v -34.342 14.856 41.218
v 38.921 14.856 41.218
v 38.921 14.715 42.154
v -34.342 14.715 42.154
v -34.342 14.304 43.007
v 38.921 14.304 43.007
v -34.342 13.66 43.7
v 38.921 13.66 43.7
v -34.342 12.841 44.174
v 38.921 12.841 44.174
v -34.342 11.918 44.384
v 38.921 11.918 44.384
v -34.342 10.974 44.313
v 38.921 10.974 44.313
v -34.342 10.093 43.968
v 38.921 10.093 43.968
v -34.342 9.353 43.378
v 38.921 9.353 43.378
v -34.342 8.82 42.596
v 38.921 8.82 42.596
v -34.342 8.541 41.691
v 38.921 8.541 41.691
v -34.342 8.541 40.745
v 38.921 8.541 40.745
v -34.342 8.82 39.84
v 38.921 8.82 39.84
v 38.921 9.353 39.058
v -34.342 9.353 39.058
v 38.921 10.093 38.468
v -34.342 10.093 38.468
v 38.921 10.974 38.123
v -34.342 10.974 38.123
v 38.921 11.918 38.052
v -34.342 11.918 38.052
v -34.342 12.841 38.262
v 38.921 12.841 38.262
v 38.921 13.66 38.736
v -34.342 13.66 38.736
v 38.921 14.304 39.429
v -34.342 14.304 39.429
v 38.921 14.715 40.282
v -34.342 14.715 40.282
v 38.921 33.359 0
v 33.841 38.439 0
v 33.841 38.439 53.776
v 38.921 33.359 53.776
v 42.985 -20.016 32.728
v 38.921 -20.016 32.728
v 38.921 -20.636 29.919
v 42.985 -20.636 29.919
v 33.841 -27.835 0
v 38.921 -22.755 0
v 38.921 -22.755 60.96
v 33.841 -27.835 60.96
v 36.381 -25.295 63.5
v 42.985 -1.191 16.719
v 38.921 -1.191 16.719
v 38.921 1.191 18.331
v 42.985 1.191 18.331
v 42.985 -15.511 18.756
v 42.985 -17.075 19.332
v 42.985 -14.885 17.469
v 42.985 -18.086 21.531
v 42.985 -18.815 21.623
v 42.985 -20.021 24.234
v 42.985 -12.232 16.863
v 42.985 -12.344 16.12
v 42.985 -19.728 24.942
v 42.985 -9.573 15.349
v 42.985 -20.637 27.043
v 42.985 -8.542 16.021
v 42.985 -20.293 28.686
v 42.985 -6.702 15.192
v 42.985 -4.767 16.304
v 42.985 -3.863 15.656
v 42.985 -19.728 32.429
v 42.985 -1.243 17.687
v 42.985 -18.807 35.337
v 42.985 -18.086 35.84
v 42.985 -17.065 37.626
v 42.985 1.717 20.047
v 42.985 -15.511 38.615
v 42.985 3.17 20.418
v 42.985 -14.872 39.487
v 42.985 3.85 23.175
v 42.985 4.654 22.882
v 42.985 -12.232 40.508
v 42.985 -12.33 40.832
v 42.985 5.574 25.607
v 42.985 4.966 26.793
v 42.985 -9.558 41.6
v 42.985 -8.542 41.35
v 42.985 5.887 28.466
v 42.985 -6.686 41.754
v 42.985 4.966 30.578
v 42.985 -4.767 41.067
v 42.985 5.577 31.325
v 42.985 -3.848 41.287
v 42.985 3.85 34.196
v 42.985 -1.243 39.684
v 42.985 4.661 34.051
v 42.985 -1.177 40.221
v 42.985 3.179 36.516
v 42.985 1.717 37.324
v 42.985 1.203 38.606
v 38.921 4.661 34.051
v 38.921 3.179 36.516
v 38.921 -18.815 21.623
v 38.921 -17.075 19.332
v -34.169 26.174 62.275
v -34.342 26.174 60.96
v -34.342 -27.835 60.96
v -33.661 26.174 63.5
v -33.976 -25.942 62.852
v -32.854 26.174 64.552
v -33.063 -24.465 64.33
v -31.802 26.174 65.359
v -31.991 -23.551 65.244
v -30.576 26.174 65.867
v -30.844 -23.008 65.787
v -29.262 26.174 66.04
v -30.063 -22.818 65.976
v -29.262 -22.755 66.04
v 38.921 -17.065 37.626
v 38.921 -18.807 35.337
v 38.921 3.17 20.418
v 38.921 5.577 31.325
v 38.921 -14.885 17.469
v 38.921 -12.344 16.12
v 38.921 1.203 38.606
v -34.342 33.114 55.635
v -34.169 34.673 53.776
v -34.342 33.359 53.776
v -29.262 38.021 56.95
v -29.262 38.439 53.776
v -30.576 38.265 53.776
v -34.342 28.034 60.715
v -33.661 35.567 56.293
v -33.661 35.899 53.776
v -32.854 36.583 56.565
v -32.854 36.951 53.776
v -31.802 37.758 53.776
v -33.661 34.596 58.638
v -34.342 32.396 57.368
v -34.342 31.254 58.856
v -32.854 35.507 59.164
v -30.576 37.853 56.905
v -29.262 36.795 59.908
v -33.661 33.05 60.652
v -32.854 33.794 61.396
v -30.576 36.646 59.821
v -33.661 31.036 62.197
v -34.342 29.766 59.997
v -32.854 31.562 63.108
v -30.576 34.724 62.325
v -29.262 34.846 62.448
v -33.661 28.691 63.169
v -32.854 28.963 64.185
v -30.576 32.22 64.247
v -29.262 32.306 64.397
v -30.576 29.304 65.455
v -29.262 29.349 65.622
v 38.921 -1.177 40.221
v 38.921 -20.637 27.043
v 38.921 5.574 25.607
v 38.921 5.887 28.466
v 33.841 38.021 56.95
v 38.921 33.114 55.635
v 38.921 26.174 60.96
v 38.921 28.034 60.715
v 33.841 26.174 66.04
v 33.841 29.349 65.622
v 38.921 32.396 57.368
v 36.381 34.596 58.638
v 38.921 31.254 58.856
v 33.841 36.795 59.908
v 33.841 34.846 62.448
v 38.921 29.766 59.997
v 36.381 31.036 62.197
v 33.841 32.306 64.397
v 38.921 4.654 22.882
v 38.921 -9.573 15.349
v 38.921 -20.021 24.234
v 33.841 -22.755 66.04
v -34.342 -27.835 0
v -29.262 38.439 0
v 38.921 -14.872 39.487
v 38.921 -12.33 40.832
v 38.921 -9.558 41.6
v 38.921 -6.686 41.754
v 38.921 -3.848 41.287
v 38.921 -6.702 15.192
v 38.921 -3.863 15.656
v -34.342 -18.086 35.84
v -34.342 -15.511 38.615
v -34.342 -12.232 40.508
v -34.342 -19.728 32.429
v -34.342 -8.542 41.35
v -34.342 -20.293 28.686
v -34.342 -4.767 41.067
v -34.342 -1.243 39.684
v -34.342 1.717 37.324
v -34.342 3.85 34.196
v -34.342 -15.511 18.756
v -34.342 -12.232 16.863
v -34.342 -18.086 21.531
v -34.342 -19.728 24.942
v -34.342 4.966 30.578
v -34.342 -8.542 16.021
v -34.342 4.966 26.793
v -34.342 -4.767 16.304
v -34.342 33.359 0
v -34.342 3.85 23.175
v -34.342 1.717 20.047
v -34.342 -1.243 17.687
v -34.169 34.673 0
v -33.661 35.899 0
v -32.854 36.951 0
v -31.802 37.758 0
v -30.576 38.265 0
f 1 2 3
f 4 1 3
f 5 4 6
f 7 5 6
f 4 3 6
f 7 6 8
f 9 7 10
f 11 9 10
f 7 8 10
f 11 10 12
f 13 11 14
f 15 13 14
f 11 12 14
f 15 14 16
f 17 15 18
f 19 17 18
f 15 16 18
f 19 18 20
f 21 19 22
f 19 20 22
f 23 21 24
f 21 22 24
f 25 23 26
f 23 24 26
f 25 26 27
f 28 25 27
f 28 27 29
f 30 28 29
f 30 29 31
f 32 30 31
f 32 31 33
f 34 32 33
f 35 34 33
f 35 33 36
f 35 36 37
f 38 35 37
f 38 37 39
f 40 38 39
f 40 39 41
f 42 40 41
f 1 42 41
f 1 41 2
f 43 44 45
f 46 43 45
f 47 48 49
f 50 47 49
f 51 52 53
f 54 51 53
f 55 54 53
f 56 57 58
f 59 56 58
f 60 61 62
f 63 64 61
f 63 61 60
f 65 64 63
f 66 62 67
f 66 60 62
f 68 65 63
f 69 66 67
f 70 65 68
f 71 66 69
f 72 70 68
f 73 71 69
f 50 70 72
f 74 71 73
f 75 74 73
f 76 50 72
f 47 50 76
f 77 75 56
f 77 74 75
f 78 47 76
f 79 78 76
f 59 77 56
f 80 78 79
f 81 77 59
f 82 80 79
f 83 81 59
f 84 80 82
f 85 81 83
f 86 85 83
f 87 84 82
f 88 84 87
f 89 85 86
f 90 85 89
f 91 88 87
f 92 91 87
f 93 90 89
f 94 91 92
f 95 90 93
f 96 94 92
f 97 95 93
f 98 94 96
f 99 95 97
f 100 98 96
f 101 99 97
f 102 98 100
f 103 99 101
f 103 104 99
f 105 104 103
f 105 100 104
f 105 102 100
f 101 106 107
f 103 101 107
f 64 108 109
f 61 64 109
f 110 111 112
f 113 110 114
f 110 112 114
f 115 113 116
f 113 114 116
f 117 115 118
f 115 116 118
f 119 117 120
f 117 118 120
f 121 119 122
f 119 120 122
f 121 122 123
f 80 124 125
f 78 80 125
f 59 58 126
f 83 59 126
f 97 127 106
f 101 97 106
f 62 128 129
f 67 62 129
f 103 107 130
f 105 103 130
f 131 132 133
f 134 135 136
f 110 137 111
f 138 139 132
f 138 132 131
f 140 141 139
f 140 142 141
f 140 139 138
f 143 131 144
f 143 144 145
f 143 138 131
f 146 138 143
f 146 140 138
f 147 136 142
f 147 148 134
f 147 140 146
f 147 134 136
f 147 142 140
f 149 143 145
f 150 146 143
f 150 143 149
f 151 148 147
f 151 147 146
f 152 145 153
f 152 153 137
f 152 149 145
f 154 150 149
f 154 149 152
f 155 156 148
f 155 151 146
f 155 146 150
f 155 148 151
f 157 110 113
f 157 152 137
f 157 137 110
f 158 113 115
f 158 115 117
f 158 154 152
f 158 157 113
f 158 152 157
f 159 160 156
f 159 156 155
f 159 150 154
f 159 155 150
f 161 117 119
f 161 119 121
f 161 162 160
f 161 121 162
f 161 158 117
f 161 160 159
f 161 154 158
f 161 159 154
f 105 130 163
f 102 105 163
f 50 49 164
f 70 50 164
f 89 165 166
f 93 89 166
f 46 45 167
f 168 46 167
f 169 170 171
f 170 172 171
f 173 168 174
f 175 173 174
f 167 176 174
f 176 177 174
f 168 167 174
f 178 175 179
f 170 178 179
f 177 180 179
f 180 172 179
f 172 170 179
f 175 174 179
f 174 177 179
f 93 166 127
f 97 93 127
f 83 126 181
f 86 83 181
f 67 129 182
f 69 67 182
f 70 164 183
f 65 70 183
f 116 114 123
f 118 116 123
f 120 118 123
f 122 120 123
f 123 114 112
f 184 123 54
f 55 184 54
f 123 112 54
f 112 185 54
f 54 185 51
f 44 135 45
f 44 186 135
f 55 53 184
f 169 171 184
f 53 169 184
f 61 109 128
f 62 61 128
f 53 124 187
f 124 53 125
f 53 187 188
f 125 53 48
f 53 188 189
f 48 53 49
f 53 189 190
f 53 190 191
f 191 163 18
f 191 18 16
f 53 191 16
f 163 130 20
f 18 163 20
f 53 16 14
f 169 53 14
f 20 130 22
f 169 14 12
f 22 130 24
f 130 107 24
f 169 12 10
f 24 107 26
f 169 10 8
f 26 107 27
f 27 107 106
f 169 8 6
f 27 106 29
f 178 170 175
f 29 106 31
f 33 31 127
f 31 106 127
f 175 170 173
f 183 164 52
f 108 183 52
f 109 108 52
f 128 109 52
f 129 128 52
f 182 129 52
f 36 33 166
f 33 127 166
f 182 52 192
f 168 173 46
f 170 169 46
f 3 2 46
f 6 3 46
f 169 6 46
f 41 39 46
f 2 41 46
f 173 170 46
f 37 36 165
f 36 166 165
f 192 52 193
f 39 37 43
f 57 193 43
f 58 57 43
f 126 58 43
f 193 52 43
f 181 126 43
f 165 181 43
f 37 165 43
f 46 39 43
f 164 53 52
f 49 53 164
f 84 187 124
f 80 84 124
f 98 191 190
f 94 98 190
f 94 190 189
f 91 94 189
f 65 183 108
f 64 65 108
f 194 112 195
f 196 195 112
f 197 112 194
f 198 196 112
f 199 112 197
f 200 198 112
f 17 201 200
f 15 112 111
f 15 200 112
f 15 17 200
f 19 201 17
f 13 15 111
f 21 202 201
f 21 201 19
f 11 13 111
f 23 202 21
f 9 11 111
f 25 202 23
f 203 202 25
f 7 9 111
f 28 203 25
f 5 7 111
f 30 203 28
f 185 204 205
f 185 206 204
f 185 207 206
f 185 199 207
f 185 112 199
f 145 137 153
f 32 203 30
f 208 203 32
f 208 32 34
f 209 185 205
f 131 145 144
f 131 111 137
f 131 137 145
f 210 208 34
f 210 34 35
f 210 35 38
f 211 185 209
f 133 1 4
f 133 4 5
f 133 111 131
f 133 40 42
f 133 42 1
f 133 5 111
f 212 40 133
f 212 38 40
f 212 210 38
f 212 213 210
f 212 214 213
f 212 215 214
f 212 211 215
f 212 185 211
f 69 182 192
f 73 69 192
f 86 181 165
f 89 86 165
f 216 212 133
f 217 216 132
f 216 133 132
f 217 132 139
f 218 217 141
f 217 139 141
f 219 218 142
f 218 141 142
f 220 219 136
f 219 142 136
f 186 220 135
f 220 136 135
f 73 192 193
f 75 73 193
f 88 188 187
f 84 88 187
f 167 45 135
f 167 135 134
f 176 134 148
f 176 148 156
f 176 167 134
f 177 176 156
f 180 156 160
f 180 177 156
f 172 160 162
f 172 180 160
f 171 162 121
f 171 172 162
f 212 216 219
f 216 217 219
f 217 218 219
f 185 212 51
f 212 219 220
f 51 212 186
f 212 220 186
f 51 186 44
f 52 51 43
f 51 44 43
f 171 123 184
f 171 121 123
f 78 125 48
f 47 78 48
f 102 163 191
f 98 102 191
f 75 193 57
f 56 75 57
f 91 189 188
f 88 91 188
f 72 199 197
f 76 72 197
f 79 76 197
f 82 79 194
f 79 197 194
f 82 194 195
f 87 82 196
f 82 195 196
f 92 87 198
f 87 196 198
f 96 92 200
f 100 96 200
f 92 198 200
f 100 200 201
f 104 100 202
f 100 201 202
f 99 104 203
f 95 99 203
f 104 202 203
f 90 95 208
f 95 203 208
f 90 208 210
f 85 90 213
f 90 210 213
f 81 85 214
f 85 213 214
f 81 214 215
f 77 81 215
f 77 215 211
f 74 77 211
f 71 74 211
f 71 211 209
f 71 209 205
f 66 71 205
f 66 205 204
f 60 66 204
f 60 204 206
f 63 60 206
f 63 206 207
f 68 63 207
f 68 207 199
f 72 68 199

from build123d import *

# Parameters (mm, degrees)
F0_W      = 73.2621699572
F0_H      = 66.2733446807
F1_DEPTH  = 66.04
F2_R      = 12.2642048969
F4_D      = 6.35
F5_SIZE   = 5.08
F6_SIZE   = 5.08
F7_SIZE   = 5.08
F8_R      = 5.08
F10_DEPTH = 4.064
F12_D     = 25.4


with BuildPart() as f1:
    # F0 (on Top) → F1 (new body)
    with BuildSketch(Plane.XY):
        with Locations((2.2894442081, 5.3018676117)):
            Rectangle(F0_W, F0_H)
    extrude(amount=F1_DEPTH)

    # F2
    f2_edges = [f1.edges().sort_by_distance(p)[0] for p in [
        (2.289444, 38.43854, 66.04),
    ]]
    fillet(f2_edges, radius=F2_R)

    # F4 (through all)
    with Locations(Plane(origin=(-34.3416407704, 0, 0), x_dir=(0, -1, 0), z_dir=(-1, 0, 0))):
        with Locations((-11.6805844009, 41.2179939449)):
            Hole(F4_D / 2)

    # F5
    f5_edges = [f1.edges().sort_by_distance(p)[0] for p in [
        (2.289444, -27.834805, 66.04),
    ]]
    chamfer(f5_edges, length=F5_SIZE)

    # F6
    f6_edges = [f1.edges().sort_by_distance(p)[0] for p in [
        (38.920529, -27.834805, 30.48),
    ]]
    chamfer(f6_edges, length=F6_SIZE)

    # F7
    f7_edges = [f1.edges().sort_by_distance(p)[0] for p in [
        (38.920529, 34.846438, 62.447898),
    ]]
    chamfer(f7_edges, length=F7_SIZE)

    # F8
    f8_edges = [f1.edges().sort_by_distance(p)[0] for p in [
        (-34.341641, 34.846438, 62.447898),
    ]]
    fillet(f8_edges, radius=F8_R)

    # F9 (on face) → F10 (join)
    with BuildSketch(Plane.YZ.offset(38.9205291867)):
        Polygon((-1.1907316289, 16.7186320739), (1.1907316289, 18.3312571628), (3.169850874, 20.4181241781), (4.6540846899, 22.8816535376), (5.5740319532, 25.6066533465), (5.8866769522, 28.4657056424), (5.5774007542, 31.3251243174), (4.6606647705, 34.0512061324), (3.1793345569, 36.5164825315), (1.2026754677, 38.6056799302), (-1.1768861149, 40.2211097802), (-3.848084536, 41.2872363771), (-6.6860175264, 41.7542088262), (-9.5579864934, 41.6001920146), (-12.3297013601, 40.8323875974), (-14.87155982, 39.4866972558), (-17.0647073965, 37.6260439744), (-18.8065949465, 35.3374298329), (-20.015773744, 32.7278678847), (-20.6357039325, 29.9193783463), (-20.6373982652, 27.0432830671), (-20.0207775172, 24.2340650658), (-18.8146741891, 21.623080254), (-17.0754843323, 19.3324153794), (-14.8845305313, 17.4691793858), (-12.3442593509, 16.1204951174), (-9.5734510482, 15.3494255516), (-6.7016655399, 15.1920250443), (-3.8631843245, 15.6556534684), align=None)
    extrude(amount=F10_DEPTH)

    # F12 (through all)
    with Locations(Plane.YZ.offset(42.9845291867)):
        with Locations((-7.5925402343, 28.6855231971)):
            Hole(F12_D / 2)


solid = f1.part
